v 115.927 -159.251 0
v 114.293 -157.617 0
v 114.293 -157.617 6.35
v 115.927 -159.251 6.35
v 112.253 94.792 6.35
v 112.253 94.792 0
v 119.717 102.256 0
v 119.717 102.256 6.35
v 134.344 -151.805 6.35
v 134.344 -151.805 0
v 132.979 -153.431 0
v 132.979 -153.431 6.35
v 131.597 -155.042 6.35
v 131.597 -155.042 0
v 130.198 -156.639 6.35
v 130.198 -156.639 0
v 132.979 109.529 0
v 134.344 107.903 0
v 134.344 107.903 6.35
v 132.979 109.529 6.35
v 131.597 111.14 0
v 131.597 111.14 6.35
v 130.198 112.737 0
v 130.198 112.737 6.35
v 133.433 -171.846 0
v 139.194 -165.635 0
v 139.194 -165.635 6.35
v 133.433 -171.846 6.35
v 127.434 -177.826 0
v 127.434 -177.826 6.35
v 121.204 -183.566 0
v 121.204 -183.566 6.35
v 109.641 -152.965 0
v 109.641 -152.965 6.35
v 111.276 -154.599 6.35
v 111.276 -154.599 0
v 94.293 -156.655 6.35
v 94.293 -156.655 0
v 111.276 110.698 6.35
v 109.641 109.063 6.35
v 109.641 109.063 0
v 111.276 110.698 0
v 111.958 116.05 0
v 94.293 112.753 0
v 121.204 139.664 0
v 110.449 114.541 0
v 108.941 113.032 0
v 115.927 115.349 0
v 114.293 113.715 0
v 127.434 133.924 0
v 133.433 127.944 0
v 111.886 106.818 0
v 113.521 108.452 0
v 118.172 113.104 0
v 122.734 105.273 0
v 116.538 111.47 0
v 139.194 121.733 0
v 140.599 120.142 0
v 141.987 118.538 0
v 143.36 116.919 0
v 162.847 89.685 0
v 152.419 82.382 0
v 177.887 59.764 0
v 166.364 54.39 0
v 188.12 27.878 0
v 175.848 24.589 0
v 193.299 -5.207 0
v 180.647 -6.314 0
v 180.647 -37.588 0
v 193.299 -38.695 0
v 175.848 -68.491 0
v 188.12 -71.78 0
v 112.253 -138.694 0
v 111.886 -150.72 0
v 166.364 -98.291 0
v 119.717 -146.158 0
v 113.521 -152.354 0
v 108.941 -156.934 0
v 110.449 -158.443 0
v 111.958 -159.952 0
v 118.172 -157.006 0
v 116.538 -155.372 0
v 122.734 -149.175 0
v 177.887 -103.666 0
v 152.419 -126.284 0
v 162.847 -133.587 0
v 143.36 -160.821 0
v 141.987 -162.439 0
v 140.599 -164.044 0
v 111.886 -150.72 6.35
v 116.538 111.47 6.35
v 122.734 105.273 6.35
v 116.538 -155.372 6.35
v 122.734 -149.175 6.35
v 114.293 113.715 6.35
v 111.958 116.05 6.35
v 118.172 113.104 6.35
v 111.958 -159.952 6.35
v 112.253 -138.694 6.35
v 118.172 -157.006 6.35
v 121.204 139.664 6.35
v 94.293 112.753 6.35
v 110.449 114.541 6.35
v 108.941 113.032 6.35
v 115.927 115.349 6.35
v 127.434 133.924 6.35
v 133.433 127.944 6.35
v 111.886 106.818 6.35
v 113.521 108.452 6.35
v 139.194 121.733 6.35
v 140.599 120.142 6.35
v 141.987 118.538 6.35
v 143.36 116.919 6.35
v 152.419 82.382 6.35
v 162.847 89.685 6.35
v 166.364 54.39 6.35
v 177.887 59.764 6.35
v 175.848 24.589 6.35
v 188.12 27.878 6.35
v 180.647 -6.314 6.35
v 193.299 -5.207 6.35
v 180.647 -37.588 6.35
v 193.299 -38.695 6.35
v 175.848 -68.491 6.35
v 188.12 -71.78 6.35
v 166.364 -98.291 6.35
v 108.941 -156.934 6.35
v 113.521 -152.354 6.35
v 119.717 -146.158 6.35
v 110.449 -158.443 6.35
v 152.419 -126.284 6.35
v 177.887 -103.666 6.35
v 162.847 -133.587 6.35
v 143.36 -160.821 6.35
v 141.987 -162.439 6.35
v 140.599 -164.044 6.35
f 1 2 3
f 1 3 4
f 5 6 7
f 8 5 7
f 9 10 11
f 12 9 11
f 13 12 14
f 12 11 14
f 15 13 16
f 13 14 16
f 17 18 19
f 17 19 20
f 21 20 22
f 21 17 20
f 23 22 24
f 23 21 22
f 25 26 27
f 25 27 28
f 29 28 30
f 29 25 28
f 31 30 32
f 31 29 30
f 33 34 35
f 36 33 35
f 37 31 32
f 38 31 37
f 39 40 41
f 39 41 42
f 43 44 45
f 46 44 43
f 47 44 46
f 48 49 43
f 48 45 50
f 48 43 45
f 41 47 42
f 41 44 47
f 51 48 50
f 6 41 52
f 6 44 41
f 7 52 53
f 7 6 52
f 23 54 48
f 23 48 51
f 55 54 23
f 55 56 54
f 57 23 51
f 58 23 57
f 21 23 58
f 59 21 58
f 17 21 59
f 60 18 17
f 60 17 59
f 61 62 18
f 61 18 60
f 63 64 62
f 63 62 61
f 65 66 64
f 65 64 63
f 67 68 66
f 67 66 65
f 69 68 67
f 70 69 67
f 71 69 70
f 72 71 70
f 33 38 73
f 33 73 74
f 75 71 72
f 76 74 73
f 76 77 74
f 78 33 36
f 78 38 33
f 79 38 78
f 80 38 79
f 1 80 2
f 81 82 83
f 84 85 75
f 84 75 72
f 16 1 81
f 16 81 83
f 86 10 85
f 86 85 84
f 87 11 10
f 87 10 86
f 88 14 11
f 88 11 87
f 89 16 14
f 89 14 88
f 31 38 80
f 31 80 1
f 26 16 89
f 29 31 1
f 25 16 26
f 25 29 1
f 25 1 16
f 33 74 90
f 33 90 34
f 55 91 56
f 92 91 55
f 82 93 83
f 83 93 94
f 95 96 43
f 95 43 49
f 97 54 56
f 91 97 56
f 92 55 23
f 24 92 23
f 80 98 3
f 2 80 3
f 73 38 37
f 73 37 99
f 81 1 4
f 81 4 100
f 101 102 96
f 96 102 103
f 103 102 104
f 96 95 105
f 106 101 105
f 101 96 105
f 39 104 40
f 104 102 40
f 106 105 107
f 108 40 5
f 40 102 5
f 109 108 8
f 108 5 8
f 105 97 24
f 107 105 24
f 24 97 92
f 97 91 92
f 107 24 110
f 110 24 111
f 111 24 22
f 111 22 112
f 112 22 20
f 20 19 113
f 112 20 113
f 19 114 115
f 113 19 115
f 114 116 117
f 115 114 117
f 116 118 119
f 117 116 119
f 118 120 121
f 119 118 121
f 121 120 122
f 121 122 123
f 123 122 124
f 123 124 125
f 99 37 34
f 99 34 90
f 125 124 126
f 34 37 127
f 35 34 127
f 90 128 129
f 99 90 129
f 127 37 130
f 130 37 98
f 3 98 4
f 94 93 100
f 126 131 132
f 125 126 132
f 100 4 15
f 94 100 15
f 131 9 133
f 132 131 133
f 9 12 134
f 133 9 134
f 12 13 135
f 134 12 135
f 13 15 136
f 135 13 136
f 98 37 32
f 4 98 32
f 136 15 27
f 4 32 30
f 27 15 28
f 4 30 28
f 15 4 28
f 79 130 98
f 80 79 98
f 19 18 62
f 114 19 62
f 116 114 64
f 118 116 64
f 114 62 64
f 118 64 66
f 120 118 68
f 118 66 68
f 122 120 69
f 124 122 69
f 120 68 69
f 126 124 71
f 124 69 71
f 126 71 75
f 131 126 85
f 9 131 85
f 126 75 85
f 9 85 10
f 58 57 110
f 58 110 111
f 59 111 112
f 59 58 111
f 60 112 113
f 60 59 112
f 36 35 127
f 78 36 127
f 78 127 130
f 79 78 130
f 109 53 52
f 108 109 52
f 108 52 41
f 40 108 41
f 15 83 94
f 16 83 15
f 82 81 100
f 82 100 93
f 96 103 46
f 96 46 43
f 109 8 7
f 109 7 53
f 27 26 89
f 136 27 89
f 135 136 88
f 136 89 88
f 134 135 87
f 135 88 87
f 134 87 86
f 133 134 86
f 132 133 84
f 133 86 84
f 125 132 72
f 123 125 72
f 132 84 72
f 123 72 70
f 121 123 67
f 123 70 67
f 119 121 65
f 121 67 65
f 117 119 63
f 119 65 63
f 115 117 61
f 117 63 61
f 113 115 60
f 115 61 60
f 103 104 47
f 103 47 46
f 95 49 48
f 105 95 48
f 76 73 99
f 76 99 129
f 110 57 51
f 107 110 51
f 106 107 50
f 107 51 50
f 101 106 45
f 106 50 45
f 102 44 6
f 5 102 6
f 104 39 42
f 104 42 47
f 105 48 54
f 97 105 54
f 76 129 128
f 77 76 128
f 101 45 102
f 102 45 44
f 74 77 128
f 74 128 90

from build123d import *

# Parameters (mm, degrees)
BOSS_EXTRUDE1_DEPTH = 6.35
BOSS_EXTRUDE3_START = -6.35
BOSS_EXTRUDE3_DEPTH = 6.35
CUT_EXTRUDE1_DEPTH  = 268.119964262


with BuildPart() as part:
    # Sketch1 → Boss-Extrude1 (new body)
    with BuildSketch(Plane.XY):
        with BuildLine():
            Line((143.360416784, 116.919323836), (134.344167558, 107.903074611))
            ThreePointArc((134.344167558, 107.903074611), (181.249035113, -21.950964887), (134.344167558, -151.805004385))
            Line((134.344167558, -151.805004385), (143.360416784, -160.82125361))
            ThreePointArc((143.360416784, -160.82125361), (193.949035113, -21.950964887), (143.360416784, 116.919323836))
        make_face()
    extrude(amount=BOSS_EXTRUDE1_DEPTH)

    # Sketch4 → Boss-Extrude3 (add)
    with BuildSketch(Plane.XY.offset(6.35).offset(BOSS_EXTRUDE3_START)):
        with BuildLine():
            Line((143.360416784, -160.82125361), (134.344167558, -151.805004385))
            ThreePointArc((134.344167558, -151.805004385), (132.290059148, -154.238328247), (130.198070847, -156.639163795))
            Line((130.198070847, -156.639163795), (139.193969877, -165.635062824))
            ThreePointArc((139.193969877, -165.635062824), (141.294938047, -163.24351662), (143.360416784, -160.82125361))
        make_face()
        with BuildLine():
            ThreePointArc((139.193969877, -165.635062824), (130.46291295, -174.865384883), (121.204013939, -183.56613137))
            Line((121.204013939, -183.56613137), (94.292689271, -156.654806703))
            Line((94.292689271, -156.654806703), (112.253201513, -138.694294461))
            Line((112.253201513, -138.694294461), (139.193969877, -165.635062824))
        make_face()
    boss_extrude3 = extrude(amount=BOSS_EXTRUDE3_DEPTH)

    # Sketch5 → Cut-Extrude1 (cut, through all)
    with BuildSketch(Plane.XY.offset(6.35)):
        Polygon((122.734319209, -149.175412156), (121.22563618, -147.666729128), (110.449328835, -158.443036473), (111.958011863, -159.951719502), (114.292878455, -157.61685291), (115.927285069, -159.251259524), (118.172349099, -157.006195494), (116.537942485, -155.37178888), align=None)
        Polygon((110.449328835, -158.443036473), (121.22563618, -147.666729128), (119.716953152, -146.1580461), (113.520576428, -152.354422823), (111.886169814, -150.720016209), (109.641105784, -152.965080239), (111.275512398, -154.599486854), (108.940645807, -156.934353445), align=None)
    cut_extrude1 = extrude(amount=-CUT_EXTRUDE1_DEPTH, mode=Mode.SUBTRACT)

    # Mirror2: Boss-Extrude3, Cut-Extrude1 across plane
    add(boss_extrude3.mirror(Plane.ZX.offset(-21.950964887)))
    add(cut_extrude1.mirror(Plane.ZX.offset(-21.950964887)), mode=Mode.SUBTRACT)


solid = part.part
